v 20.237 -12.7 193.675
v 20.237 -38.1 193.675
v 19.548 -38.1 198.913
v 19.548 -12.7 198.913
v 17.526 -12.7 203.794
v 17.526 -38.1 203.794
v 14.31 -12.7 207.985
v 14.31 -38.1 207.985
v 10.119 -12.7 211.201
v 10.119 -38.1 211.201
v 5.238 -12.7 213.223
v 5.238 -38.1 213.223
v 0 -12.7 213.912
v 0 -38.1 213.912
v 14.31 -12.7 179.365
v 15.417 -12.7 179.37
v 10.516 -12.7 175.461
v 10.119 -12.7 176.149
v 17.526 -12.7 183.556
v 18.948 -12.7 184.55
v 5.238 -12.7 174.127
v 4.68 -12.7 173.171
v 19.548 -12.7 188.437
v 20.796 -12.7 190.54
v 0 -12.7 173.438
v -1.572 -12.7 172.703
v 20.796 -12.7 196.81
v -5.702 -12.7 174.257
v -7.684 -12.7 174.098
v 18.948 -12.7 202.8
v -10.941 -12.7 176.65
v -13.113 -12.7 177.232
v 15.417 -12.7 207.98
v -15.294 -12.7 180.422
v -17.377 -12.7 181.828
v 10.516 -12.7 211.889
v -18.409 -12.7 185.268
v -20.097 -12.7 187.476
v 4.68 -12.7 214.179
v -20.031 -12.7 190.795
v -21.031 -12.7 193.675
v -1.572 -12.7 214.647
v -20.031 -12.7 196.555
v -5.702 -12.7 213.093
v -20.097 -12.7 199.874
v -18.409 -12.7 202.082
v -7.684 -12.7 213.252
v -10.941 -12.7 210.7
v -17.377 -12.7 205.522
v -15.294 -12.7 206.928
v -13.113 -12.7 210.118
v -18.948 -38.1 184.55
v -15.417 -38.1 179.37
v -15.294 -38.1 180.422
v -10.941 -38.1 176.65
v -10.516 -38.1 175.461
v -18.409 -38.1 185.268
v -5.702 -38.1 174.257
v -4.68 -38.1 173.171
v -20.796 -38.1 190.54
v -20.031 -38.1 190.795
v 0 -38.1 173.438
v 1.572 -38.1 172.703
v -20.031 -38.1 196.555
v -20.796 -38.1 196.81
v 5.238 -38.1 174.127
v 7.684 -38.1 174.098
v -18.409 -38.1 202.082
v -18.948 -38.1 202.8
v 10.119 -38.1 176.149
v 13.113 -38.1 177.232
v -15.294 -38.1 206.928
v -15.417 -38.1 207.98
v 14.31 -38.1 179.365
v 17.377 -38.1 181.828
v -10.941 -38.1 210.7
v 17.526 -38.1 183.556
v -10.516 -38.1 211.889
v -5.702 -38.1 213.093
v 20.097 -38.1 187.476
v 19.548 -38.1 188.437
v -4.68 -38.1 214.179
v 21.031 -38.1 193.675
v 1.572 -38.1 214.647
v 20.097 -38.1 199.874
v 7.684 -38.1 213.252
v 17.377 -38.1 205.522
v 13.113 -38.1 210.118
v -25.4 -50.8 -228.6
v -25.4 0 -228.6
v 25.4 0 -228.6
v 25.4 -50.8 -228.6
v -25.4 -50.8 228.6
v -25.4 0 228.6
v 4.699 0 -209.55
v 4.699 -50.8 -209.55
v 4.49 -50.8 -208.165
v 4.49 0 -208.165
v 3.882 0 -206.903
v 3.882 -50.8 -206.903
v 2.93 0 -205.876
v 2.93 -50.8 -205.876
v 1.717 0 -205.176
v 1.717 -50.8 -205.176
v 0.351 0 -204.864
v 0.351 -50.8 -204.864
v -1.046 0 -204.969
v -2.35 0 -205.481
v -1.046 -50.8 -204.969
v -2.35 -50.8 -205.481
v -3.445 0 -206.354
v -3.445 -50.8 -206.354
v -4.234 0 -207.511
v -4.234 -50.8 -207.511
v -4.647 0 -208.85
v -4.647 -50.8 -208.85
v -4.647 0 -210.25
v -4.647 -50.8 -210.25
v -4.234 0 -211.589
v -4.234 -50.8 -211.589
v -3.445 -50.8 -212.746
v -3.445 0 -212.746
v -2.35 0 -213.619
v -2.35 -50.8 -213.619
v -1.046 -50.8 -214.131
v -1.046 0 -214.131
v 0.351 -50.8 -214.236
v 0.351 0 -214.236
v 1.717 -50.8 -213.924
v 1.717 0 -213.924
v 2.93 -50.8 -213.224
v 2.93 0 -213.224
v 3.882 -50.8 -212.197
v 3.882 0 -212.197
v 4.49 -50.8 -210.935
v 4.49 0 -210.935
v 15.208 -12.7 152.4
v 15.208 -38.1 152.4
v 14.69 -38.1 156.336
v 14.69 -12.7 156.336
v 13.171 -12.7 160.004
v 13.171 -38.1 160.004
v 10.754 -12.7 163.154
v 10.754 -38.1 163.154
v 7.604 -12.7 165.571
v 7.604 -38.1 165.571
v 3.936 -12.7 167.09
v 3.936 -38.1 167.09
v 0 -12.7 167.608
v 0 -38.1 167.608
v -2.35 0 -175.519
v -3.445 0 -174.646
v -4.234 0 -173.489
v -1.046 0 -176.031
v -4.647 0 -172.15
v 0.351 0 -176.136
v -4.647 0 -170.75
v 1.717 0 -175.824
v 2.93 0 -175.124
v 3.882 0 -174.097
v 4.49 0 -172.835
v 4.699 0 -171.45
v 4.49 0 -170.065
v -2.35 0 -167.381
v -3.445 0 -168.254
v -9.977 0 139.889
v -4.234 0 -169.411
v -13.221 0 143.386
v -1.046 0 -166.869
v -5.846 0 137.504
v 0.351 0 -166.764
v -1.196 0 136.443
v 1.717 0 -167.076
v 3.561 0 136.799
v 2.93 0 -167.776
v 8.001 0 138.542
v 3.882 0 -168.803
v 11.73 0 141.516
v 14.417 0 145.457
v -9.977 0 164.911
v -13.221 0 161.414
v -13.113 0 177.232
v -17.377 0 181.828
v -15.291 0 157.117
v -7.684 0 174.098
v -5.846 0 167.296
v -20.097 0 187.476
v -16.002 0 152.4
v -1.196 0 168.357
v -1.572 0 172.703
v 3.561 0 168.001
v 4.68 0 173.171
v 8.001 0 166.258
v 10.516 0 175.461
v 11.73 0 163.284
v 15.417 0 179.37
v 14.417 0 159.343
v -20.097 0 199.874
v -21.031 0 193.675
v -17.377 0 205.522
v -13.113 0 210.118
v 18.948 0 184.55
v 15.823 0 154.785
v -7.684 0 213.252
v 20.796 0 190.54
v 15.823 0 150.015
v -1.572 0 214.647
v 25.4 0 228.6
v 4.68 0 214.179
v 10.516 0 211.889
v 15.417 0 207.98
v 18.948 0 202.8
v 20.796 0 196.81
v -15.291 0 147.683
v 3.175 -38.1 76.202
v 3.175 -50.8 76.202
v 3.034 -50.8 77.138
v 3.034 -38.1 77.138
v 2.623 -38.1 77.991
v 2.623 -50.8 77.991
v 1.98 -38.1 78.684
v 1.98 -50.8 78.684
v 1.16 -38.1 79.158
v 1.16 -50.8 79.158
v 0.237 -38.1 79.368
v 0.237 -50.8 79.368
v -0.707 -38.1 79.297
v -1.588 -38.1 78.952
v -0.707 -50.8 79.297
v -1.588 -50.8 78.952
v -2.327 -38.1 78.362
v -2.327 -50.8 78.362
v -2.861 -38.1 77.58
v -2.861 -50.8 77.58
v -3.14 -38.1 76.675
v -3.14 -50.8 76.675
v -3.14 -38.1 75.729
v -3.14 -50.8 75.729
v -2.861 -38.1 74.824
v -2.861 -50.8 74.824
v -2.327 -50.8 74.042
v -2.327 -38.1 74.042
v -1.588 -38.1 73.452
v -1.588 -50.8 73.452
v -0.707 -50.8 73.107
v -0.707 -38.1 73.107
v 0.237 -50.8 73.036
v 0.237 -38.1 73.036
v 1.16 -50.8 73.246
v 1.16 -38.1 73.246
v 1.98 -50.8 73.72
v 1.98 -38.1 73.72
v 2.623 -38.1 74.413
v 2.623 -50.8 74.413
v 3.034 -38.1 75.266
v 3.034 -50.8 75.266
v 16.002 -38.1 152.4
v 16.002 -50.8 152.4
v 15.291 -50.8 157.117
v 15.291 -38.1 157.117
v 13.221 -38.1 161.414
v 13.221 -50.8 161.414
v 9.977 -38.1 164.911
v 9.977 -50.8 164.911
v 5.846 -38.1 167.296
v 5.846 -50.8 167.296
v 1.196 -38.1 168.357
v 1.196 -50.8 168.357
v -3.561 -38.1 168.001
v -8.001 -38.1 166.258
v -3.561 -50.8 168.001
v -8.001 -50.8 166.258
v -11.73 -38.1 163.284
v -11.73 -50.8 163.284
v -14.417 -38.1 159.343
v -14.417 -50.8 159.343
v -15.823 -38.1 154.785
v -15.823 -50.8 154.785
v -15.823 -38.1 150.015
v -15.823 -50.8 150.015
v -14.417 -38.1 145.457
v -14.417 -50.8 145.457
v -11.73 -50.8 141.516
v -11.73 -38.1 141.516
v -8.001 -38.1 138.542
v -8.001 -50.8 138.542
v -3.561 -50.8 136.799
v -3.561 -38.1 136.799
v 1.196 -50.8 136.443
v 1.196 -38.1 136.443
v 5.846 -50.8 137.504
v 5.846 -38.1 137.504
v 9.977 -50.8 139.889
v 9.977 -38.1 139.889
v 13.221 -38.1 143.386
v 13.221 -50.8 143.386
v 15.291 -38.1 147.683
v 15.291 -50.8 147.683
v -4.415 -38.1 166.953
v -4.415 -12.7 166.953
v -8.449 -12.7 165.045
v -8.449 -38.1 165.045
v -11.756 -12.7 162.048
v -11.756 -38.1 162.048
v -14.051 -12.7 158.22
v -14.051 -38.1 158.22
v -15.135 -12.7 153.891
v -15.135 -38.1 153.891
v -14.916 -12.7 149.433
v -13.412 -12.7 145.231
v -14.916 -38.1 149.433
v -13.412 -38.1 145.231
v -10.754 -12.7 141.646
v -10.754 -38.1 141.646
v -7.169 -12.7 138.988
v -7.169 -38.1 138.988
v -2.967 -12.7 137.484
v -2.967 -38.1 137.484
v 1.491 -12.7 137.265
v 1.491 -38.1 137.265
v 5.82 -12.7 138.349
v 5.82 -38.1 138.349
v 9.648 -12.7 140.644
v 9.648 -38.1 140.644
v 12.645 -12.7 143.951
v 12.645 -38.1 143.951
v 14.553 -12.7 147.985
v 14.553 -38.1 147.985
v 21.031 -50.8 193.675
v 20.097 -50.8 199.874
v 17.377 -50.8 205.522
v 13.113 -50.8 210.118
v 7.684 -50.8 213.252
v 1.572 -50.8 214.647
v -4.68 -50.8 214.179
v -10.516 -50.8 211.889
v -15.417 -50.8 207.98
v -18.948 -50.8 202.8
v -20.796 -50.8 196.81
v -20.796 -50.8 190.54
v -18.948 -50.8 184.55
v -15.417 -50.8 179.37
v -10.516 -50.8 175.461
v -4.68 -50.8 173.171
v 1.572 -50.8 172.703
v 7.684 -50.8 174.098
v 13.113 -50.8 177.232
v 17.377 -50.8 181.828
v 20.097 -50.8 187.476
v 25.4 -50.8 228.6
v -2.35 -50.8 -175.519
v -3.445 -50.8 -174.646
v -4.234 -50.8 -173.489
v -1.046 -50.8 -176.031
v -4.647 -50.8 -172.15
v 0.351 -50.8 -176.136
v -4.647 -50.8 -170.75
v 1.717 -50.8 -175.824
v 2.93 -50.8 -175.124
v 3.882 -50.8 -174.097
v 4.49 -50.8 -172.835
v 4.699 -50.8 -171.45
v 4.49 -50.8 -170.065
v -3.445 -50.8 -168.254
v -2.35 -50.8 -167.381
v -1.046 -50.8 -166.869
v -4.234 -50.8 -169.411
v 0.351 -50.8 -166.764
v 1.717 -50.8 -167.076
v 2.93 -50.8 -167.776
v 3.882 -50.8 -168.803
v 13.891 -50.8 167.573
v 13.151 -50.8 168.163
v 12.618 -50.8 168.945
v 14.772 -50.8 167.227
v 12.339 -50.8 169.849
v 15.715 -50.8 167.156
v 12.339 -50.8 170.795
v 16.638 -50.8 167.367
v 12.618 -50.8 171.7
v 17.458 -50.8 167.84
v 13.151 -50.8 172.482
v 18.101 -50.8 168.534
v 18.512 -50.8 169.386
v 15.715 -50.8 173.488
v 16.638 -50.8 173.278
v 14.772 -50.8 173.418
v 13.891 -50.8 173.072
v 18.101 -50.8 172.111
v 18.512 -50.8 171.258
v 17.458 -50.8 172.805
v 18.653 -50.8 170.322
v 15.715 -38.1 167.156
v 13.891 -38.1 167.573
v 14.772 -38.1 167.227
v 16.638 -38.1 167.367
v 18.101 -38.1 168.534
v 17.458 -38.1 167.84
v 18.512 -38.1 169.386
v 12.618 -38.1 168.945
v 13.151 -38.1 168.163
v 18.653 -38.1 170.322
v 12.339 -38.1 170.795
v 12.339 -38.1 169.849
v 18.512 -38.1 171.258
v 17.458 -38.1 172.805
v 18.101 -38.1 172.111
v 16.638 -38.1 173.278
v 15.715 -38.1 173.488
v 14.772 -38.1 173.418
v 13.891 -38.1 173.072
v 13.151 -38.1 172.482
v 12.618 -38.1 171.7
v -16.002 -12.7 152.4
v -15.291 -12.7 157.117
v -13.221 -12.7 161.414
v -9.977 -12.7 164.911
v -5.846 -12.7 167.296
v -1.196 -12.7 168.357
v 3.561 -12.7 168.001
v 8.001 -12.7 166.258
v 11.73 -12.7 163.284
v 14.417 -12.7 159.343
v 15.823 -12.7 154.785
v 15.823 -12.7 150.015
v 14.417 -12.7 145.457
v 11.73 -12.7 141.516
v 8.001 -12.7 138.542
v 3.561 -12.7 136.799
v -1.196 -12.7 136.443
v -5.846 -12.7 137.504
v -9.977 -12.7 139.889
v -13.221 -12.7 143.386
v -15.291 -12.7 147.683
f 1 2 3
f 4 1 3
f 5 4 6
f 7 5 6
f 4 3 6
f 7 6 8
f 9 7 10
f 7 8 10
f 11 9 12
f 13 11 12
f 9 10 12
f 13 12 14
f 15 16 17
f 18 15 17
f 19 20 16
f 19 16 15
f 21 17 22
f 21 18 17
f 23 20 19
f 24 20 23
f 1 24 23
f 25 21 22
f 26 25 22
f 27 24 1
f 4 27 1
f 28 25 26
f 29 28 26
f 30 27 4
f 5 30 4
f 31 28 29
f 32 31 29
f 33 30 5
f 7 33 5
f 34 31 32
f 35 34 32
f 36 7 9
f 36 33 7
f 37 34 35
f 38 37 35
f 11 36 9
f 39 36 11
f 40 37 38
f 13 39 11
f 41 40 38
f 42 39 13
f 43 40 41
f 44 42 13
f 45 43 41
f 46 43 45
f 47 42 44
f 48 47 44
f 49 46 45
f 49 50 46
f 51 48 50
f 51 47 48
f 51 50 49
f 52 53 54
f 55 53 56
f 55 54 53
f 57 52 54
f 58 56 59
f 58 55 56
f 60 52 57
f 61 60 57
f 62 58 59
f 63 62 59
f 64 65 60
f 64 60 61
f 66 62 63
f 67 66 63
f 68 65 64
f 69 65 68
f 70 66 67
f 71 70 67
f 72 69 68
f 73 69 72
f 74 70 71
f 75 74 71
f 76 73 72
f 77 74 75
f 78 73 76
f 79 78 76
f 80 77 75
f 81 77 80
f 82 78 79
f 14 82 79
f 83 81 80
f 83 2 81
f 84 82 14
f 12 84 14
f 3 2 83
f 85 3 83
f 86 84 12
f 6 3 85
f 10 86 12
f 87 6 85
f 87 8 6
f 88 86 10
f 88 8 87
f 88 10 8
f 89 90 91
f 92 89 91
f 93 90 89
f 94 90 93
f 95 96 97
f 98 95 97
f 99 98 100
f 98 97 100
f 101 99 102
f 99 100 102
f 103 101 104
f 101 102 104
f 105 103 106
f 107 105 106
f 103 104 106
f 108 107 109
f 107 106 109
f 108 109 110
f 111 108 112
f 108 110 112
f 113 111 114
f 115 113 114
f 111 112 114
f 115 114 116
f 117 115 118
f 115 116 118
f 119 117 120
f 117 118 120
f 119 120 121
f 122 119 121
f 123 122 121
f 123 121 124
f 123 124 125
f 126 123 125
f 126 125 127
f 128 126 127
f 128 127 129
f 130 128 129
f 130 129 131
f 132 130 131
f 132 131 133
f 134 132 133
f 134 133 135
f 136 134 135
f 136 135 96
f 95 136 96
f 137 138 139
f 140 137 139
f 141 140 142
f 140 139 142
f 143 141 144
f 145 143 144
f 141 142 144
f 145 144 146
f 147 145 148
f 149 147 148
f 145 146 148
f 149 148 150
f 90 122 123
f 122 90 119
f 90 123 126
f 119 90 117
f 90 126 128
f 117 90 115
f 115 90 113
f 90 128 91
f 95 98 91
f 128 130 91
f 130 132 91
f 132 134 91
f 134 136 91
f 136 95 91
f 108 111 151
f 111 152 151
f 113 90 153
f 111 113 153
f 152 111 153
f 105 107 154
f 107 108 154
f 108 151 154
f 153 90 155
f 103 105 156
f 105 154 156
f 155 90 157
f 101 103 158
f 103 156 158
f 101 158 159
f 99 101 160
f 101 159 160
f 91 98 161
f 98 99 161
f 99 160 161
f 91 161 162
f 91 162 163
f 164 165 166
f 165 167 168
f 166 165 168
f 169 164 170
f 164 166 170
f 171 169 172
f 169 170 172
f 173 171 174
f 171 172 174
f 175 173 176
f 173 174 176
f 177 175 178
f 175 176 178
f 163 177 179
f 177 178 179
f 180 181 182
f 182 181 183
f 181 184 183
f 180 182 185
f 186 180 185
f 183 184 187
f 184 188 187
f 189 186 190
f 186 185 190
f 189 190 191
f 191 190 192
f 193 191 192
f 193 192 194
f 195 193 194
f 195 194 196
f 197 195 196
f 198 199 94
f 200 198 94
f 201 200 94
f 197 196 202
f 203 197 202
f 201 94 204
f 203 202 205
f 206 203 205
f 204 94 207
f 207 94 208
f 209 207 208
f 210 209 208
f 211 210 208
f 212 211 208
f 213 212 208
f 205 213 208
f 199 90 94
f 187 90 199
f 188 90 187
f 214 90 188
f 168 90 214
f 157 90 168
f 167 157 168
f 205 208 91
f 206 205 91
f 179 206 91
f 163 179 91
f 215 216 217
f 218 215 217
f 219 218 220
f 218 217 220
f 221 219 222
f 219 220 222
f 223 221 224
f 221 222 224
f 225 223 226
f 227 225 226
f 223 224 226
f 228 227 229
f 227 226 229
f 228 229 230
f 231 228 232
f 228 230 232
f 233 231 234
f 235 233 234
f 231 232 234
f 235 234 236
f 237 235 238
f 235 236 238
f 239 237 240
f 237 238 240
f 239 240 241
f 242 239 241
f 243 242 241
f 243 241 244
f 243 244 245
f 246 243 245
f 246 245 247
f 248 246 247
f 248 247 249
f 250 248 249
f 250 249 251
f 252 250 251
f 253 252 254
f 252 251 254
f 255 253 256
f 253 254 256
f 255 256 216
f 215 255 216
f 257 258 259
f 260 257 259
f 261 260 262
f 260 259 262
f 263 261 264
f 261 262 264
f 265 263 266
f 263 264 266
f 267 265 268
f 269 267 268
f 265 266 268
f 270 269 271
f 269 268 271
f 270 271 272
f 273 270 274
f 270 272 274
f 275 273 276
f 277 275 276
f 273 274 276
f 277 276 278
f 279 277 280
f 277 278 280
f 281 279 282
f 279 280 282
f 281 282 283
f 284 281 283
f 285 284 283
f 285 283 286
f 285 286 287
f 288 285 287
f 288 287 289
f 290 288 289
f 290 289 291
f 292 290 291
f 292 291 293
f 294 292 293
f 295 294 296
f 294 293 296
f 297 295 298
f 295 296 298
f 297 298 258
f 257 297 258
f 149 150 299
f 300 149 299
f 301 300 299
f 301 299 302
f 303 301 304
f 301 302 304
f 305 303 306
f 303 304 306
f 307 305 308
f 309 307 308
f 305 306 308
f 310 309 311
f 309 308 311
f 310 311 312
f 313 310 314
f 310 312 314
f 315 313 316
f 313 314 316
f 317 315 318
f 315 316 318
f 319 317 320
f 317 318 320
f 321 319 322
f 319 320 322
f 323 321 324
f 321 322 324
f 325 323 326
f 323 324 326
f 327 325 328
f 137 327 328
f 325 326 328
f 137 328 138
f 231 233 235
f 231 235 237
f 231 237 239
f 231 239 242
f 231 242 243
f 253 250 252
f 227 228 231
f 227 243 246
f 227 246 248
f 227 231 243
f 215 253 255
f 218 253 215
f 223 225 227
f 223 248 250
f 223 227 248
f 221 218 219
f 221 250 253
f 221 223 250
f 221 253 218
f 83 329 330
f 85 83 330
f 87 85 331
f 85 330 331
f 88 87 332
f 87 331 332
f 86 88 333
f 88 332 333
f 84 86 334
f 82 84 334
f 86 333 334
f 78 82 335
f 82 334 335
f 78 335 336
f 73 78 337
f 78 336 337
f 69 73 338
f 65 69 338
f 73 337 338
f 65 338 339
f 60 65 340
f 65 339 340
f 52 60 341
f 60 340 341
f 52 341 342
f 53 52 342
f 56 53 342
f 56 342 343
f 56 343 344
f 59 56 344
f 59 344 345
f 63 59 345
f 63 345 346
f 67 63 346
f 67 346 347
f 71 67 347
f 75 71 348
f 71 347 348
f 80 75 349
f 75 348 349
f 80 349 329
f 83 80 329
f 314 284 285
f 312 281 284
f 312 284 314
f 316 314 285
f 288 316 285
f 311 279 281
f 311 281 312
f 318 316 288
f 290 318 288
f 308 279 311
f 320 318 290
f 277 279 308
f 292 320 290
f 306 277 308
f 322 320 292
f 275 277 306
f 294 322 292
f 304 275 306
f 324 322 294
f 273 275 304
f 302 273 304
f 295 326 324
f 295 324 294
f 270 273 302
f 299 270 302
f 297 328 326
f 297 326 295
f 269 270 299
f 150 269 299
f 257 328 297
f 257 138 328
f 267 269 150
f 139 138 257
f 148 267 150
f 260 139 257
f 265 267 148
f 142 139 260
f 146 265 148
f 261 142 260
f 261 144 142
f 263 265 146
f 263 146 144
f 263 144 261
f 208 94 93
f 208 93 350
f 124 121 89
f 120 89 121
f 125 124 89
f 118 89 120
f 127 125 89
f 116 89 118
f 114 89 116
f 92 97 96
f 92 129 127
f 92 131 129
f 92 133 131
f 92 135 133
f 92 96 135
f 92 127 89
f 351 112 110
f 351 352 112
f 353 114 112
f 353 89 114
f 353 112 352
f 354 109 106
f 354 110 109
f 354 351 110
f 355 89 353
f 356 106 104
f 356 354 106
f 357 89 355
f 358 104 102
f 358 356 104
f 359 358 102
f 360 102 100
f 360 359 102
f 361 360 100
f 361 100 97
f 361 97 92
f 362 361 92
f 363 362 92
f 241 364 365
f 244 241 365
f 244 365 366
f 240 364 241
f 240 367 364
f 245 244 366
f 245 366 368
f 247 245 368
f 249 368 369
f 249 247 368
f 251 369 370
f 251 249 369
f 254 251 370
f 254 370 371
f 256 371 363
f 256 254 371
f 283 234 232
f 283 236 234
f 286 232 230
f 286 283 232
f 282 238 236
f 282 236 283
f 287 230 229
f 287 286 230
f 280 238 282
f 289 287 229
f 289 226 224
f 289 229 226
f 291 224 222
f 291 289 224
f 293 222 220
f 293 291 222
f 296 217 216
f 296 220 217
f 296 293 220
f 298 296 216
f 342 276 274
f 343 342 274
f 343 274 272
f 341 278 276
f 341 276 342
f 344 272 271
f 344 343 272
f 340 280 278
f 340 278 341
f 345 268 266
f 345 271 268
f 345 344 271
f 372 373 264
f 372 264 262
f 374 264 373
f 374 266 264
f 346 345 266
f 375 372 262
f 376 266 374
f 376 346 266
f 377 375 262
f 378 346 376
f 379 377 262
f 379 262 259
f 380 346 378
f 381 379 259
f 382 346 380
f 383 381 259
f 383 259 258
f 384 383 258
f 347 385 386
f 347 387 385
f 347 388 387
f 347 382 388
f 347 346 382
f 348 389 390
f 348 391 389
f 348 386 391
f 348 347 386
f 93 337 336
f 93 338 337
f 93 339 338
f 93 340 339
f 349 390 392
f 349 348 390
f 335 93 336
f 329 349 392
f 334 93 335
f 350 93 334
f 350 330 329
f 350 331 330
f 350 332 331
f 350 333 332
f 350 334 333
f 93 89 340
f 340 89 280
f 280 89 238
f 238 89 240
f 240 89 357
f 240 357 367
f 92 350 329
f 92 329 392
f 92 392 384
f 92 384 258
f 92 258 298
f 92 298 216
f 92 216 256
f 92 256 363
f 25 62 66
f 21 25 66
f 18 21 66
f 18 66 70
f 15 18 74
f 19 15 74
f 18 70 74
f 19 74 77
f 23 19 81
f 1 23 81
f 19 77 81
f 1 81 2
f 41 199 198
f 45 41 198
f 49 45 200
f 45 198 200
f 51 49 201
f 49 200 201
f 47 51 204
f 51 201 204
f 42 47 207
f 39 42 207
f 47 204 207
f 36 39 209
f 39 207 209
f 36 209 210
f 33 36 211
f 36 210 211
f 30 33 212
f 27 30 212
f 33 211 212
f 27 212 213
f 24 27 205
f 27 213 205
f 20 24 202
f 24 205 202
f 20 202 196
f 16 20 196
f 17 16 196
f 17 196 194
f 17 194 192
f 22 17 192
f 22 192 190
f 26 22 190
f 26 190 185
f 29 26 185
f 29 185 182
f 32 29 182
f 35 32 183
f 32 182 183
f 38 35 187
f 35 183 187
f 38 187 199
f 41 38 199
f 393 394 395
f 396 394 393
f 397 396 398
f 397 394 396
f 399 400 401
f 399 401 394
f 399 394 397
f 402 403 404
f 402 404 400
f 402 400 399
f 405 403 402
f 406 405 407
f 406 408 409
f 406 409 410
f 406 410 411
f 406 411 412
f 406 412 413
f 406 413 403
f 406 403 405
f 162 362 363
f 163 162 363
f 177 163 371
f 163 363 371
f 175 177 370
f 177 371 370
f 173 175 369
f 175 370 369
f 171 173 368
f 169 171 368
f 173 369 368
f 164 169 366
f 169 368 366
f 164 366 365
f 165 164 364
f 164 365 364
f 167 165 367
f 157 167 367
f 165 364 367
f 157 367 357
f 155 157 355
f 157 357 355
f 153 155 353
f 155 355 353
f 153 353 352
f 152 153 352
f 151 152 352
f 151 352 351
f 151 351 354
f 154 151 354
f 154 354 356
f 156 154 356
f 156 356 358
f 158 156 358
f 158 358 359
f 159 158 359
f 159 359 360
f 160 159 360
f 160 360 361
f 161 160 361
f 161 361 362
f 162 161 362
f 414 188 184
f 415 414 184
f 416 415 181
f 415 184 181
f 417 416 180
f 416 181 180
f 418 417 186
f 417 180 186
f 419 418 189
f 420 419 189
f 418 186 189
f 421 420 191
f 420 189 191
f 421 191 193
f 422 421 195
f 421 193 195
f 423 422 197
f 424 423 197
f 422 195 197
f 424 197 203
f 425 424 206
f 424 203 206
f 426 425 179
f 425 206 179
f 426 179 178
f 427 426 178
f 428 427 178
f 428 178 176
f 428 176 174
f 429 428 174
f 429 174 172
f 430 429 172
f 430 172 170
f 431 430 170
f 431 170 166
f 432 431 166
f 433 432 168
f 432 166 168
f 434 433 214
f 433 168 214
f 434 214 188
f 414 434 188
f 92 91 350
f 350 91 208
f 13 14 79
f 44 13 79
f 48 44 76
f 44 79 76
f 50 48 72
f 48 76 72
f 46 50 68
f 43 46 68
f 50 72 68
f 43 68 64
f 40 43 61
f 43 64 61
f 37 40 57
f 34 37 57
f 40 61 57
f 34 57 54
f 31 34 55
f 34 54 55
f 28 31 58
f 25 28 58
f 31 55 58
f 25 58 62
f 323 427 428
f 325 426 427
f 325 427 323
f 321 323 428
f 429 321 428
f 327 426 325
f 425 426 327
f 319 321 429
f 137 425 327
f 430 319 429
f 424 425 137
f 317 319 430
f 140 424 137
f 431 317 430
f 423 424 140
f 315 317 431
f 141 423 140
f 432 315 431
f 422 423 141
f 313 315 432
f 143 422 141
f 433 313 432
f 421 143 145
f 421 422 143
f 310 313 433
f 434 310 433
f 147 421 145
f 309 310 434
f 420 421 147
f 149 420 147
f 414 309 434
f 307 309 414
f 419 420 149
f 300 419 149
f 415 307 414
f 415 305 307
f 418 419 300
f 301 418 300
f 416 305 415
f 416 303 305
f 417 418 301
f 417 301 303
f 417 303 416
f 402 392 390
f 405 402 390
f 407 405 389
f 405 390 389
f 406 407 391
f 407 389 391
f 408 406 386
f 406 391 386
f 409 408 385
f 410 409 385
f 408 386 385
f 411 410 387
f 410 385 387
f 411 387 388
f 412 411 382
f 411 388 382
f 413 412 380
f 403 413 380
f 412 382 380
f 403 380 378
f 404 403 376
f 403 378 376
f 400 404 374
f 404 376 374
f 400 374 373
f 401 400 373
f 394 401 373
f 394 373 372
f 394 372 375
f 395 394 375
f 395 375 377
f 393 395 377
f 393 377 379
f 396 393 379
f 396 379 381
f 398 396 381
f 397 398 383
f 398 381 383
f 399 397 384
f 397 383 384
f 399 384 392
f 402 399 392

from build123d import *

# Parameters (mm, degrees)
F0_W      = 50.8
F0_H      = 457.2
F1_DEPTH  = 50.8
F2_R      = 4.699
F3_DEPTH  = 50.801
F5_DEPTH  = 50.801
F7_R      = 21.0312
F8_DEPTH  = 12.7
F9_R      = 16.002
F10_DEPTH = 12.7
F11_R     = 16.002
F12_DEPTH = 12.7
F13_R     = 3.175
F14_DEPTH = 12.7
F6_R      = 21.0312
F15_DEPTH = 12.7
F16_DEPTH = 12.7


with BuildPart() as f1:
    # F0 (on Front) → F1 (new body)
    with BuildSketch(Plane.XZ):
        Rectangle(F0_W, F0_H)
    extrude(amount=F1_DEPTH)

    # F2 (on face) → F3 (cut, through all)
    with BuildSketch(Plane.XZ.offset(50.8)):
        with Locations((0, -171.45)):
            Circle(F2_R)
        with Locations((0, -209.55)):
            Circle(F2_R)
    extrude(amount=-F3_DEPTH, mode=Mode.SUBTRACT)

    # F4 (on face) → F5 (cut, through all)
    with BuildSketch(Plane.XZ.offset(50.8)):
        with BuildLine():
            ThreePointArc((0, 173.43755), (14.310038, 179.364962), (20.23745, 193.675))
            ThreePointArc((20.23745, 193.675), (14.310038, 207.985038), (0, 213.91245))
            Line((0, 213.91245), (0, 193.675))
            Line((0, 193.675), (0, 173.43755))
        make_face()
        with BuildLine():
            ThreePointArc((15.20825, 152.4), (10.753857, 163.153857), (0, 167.60825))
            ThreePointArc((0, 167.60825), (-10.753857, 141.646143), (15.20825, 152.4))
        make_face()
        with BuildLine():
            Line((0, 193.675), (0, 213.91245))
            ThreePointArc((0, 213.91245), (-20.23745, 193.675), (0, 173.43755))
            Line((0, 173.43755), (0, 193.675))
        make_face()
    extrude(amount=-F5_DEPTH, mode=Mode.SUBTRACT)

    # F7 (on face) → F8 (cut)
    with BuildSketch(Plane(origin=(0, 0, 0), x_dir=(-1, 0, 0), z_dir=(0, 1, 0))):
        with Locations((0, 193.675)):
            Circle(F7_R)
    extrude(amount=-F8_DEPTH, mode=Mode.SUBTRACT)

    # F9 (on face) → F10 (cut)
    with BuildSketch(Plane.XZ.offset(50.8)):
        with Locations((0, 152.4)):
            Circle(F9_R)
    extrude(amount=-F10_DEPTH, mode=Mode.SUBTRACT)

    # F11 (on face) → F12 (cut)
    with BuildSketch(Plane(origin=(0, 0, 0), x_dir=(-1, 0, 0), z_dir=(0, 1, 0))):
        with Locations((0, 152.4)):
            Circle(F11_R)
    extrude(amount=-F12_DEPTH, mode=Mode.SUBTRACT)

    # F13 (on face) → F14 (cut)
    with BuildSketch(Plane.XZ.offset(50.8)):
        with Locations((15.478125, 170.32224)):
            Circle(F13_R)
        with Locations((0, 76.201982)):
            Circle(F13_R)
    extrude(amount=-F14_DEPTH, mode=Mode.SUBTRACT)

    # F6 (on face) → F15 (cut)
    with BuildSketch(Plane.XZ.offset(50.8)):
        with Locations((0, 193.675)):
            Circle(F6_R)
    extrude(amount=-F15_DEPTH, mode=Mode.SUBTRACT)

    # F6 (on face) → F16 (cut)
    with BuildSketch(Plane.XZ.offset(50.8)):
        with Locations((0, 193.675)):
            Circle(F6_R)
    extrude(amount=-F16_DEPTH, mode=Mode.SUBTRACT)


solid = f1.part
